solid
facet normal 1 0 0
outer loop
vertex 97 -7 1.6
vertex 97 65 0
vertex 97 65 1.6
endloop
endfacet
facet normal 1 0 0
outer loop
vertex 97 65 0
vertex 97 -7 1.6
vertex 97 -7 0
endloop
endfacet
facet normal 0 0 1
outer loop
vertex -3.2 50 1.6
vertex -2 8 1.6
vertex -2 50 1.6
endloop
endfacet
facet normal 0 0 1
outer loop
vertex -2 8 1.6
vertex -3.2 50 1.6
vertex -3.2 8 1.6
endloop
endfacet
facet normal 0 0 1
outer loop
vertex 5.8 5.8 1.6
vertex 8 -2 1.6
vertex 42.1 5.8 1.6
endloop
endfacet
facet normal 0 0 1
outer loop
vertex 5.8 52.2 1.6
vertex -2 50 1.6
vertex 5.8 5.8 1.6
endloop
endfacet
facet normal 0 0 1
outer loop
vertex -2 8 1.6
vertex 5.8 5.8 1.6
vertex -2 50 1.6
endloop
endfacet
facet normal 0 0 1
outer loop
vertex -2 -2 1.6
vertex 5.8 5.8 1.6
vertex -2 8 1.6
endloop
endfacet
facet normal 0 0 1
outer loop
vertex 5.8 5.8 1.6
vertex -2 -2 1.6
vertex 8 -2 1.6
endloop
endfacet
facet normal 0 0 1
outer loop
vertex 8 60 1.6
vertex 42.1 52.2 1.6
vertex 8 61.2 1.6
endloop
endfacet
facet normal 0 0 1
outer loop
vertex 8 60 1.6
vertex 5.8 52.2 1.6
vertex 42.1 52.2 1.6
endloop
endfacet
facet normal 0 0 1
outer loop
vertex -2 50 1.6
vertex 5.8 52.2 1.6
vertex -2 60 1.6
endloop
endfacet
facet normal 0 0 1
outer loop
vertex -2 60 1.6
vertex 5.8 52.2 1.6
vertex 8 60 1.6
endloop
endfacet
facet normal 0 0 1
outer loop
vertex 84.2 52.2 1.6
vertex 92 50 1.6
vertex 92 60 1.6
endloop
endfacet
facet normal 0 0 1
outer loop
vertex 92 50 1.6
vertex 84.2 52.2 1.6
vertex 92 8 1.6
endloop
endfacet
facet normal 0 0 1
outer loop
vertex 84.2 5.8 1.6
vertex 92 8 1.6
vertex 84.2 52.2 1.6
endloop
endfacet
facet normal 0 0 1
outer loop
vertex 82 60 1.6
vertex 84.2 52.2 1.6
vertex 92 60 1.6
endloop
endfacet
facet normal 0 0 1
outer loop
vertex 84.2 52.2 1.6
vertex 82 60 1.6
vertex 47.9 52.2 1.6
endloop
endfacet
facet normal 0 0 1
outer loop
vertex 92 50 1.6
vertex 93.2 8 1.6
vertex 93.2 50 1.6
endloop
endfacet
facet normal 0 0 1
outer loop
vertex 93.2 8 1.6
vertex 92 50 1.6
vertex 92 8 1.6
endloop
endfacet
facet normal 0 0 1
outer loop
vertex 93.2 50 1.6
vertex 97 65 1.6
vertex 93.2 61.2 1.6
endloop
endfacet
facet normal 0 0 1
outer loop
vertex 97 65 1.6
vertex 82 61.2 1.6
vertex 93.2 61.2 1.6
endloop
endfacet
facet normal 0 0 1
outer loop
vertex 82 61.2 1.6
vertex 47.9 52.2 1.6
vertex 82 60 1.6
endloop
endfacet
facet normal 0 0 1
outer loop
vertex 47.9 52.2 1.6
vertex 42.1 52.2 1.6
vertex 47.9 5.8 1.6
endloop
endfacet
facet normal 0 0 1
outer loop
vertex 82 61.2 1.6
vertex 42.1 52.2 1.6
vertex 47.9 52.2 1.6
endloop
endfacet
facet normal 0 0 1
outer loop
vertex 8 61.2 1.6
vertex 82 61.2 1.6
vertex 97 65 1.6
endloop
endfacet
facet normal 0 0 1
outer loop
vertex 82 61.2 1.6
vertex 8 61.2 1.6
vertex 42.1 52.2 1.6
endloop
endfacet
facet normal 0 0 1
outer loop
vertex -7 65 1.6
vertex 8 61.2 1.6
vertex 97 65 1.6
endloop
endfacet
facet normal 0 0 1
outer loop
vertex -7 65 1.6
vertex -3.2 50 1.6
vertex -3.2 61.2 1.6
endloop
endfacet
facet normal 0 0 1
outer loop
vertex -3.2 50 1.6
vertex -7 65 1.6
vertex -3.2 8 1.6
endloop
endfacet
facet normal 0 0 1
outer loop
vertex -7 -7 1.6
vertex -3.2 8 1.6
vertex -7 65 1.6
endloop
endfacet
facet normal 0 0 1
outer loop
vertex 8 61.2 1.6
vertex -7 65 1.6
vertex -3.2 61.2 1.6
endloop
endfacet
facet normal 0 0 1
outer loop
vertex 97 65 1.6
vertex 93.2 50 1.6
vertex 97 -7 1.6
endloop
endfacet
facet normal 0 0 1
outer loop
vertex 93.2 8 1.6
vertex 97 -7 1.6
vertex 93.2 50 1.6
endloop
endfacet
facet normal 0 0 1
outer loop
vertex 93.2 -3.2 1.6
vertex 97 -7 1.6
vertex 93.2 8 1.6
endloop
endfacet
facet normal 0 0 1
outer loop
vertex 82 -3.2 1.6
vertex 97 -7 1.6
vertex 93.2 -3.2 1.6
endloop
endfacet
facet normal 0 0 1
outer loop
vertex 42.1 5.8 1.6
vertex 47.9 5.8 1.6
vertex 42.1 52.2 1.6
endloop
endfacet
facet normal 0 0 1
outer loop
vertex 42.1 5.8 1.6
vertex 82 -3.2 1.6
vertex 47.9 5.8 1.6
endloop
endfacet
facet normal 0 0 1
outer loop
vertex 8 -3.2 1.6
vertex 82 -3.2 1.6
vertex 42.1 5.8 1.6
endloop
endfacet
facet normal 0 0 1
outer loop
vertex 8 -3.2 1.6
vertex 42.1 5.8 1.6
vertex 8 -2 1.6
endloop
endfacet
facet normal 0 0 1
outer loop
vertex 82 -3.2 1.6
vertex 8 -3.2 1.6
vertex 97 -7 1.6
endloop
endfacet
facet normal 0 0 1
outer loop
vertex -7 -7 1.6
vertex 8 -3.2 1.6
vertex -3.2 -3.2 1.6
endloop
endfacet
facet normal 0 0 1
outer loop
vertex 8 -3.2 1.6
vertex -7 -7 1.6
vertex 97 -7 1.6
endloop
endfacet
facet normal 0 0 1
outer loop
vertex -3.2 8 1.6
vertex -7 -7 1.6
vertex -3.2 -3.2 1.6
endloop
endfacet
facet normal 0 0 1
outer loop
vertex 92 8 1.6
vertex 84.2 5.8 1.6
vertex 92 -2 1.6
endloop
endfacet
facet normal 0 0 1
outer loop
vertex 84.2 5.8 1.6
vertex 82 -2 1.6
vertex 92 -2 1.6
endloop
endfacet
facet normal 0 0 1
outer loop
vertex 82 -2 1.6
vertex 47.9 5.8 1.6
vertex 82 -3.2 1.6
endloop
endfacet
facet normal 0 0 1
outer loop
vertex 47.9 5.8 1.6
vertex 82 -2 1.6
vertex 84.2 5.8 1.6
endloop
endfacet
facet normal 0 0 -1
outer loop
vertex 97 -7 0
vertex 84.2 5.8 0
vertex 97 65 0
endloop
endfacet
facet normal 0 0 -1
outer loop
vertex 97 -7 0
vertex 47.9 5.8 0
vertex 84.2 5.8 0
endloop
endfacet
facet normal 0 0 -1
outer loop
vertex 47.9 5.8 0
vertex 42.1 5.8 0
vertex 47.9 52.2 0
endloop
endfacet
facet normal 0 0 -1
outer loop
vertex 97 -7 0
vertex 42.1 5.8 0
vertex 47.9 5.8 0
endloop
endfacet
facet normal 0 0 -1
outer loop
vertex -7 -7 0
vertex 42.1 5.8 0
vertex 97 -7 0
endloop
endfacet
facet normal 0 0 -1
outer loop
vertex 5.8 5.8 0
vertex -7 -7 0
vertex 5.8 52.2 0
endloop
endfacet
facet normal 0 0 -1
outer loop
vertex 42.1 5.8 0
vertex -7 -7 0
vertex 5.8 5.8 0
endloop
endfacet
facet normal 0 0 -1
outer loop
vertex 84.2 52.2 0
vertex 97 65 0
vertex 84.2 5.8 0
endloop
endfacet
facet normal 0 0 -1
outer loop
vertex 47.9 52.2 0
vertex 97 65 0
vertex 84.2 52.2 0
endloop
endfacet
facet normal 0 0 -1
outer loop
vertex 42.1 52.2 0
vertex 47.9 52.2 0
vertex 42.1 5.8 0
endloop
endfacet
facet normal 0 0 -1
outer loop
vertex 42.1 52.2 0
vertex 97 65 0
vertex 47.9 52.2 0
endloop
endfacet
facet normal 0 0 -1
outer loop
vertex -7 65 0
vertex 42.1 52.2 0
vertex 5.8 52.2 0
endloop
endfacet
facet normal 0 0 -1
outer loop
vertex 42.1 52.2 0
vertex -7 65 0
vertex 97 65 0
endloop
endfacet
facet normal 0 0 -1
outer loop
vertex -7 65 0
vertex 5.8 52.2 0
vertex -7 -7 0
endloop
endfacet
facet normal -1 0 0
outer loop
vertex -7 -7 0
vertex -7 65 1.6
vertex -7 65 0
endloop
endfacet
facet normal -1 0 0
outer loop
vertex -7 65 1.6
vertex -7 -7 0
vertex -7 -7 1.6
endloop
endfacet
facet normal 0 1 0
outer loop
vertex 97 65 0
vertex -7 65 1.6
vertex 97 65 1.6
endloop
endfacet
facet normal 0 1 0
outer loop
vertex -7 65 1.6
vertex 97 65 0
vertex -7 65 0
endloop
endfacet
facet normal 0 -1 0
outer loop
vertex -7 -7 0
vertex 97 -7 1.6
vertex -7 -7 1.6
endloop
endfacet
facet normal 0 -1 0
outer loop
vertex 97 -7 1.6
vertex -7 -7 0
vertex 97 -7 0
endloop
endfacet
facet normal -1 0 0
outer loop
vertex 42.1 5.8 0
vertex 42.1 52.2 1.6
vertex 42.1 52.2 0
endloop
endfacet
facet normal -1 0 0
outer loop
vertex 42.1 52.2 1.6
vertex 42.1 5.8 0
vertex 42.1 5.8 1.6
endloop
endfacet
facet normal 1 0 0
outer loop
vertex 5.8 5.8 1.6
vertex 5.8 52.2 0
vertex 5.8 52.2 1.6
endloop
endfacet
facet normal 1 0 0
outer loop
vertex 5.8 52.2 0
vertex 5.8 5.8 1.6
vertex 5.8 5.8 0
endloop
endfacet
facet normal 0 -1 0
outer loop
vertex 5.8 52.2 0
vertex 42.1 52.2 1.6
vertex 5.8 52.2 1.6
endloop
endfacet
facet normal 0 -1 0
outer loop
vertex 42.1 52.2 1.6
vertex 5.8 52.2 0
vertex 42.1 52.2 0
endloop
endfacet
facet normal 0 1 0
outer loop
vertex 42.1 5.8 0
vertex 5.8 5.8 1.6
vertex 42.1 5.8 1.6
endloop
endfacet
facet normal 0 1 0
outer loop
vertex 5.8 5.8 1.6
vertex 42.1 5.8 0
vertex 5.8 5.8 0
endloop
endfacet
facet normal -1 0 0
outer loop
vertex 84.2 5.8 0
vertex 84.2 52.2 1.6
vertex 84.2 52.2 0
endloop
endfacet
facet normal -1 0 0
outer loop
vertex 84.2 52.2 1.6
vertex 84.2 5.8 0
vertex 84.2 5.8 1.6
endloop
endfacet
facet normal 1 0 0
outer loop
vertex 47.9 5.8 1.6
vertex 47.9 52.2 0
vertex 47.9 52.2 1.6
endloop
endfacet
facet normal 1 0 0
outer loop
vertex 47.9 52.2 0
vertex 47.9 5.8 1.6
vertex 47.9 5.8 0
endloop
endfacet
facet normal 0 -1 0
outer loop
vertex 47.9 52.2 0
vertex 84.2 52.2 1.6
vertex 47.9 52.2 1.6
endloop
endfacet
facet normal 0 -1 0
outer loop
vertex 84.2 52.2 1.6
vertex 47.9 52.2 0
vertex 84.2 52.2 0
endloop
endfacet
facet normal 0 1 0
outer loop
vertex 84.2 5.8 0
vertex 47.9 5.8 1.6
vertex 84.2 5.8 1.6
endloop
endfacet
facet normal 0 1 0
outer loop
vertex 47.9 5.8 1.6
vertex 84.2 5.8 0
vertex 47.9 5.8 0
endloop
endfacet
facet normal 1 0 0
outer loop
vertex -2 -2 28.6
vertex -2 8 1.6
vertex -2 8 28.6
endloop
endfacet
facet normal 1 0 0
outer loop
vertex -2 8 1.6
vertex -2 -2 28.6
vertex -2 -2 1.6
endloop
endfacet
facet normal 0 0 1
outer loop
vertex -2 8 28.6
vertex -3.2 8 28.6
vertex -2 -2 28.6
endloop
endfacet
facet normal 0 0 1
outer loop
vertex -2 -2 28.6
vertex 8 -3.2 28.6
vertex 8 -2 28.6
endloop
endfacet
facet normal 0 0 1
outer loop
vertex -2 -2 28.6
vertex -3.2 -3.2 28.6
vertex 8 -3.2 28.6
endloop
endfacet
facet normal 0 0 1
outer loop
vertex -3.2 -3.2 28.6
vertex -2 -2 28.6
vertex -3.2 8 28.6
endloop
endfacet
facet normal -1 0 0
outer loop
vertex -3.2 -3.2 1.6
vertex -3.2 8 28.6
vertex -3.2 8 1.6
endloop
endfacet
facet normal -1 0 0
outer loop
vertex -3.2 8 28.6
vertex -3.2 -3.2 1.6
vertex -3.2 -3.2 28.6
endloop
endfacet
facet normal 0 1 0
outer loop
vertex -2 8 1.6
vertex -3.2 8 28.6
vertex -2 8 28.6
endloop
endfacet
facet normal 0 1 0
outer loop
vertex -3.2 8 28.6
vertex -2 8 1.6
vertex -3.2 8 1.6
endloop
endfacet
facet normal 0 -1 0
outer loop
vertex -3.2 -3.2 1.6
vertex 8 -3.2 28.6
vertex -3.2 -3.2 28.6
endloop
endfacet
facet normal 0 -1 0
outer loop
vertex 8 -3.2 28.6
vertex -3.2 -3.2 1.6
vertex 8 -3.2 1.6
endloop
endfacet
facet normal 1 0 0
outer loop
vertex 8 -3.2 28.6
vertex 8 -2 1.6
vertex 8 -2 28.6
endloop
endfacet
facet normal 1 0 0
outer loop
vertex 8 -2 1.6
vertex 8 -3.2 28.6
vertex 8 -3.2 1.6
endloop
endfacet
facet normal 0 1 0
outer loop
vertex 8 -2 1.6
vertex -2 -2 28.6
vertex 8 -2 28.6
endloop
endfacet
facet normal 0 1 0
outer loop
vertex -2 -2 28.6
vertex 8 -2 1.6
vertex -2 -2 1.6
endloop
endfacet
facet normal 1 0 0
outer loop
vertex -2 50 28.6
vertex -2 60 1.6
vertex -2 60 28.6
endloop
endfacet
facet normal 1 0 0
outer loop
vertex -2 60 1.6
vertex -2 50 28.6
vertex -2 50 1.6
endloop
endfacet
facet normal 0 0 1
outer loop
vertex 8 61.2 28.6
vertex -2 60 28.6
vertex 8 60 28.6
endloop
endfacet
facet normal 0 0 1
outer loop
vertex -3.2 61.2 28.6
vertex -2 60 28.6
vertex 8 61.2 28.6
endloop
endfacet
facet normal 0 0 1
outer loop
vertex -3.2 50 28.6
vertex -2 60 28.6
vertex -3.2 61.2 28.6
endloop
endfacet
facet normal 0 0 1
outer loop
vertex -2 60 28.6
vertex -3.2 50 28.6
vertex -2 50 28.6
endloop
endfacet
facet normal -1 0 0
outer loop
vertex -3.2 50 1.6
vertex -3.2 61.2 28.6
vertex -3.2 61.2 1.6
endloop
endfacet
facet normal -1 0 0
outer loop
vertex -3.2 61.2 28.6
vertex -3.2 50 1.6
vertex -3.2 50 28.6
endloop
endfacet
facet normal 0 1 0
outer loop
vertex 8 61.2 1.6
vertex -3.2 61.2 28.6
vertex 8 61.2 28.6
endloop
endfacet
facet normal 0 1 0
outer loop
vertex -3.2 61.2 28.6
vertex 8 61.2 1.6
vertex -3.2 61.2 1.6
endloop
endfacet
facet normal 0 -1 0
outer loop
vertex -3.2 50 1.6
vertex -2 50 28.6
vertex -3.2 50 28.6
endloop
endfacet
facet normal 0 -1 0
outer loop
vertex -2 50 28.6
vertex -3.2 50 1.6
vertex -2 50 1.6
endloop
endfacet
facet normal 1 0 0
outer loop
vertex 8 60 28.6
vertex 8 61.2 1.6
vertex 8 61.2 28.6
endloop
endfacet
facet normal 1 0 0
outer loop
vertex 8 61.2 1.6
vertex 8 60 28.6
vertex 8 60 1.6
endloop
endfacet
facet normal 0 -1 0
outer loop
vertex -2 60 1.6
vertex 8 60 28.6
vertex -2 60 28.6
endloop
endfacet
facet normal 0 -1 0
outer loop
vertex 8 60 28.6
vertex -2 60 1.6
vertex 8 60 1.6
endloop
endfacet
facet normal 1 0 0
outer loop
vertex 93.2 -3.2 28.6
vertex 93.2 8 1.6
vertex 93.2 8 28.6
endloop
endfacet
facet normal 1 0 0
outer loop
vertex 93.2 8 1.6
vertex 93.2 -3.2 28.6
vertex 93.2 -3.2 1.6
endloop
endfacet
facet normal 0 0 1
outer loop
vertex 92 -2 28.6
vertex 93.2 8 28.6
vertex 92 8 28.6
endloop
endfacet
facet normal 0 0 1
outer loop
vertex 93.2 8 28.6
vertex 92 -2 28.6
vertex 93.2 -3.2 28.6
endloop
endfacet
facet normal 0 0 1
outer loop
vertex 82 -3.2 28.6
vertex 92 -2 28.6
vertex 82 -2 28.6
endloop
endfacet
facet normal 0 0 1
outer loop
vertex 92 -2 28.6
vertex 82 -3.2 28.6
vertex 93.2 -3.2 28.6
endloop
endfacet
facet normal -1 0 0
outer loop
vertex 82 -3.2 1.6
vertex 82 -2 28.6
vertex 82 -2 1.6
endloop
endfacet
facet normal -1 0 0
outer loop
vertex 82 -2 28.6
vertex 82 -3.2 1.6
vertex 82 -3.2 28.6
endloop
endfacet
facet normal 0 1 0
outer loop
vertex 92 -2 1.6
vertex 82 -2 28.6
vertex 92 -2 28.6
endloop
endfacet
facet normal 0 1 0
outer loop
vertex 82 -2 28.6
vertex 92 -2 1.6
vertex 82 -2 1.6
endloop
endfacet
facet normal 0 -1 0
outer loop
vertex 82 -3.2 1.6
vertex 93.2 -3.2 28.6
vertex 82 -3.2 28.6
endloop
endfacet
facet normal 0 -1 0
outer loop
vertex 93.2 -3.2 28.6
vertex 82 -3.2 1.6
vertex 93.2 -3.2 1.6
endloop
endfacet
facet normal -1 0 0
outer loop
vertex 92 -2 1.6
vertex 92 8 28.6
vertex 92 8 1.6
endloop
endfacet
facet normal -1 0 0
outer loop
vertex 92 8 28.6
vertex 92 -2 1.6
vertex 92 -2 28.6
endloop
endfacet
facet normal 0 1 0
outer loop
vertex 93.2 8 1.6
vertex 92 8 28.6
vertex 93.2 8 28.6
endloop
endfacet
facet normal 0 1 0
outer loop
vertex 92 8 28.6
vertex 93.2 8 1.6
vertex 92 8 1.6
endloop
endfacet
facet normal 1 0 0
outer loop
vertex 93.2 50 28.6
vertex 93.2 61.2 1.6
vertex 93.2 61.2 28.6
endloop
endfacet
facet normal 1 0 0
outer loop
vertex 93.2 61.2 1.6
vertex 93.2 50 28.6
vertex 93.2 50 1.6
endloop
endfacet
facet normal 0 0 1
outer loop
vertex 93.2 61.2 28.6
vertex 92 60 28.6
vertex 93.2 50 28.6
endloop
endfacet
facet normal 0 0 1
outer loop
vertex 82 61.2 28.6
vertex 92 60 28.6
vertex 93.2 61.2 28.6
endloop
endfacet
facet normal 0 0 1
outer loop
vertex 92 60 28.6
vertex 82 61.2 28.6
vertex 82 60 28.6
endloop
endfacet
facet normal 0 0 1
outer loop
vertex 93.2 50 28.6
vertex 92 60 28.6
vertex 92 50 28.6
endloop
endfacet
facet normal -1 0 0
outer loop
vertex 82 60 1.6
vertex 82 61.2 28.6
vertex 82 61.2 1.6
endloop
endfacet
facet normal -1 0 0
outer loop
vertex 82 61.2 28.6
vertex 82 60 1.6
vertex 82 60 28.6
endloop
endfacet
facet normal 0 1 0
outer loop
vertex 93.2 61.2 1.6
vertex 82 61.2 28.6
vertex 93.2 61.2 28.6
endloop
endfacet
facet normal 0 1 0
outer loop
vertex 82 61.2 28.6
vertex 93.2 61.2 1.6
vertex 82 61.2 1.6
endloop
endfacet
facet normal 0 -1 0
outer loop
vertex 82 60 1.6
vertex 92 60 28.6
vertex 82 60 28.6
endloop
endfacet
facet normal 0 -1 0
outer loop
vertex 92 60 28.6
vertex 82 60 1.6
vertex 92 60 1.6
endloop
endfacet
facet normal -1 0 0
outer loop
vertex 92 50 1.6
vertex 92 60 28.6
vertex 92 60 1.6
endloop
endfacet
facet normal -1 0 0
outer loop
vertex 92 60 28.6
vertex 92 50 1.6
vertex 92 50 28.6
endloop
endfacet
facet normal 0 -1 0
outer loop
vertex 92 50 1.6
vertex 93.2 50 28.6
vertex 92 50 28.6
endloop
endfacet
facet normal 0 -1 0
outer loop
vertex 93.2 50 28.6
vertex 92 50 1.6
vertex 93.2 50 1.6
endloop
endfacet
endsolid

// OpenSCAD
// Card Holder

// Card Length
CardLength = 90;

// Card Width
CardWidth = 58;

// Tolerance
Tolerance = 2;

// Size Of Nozzle
SizeOfNozzle = 0.4;

// Outside Skirt
OutsideSkirt = 5;

//Wall Thickness In Layers
WallThicknessInLayers = 3;

//Wall Height
WallHeight = 27;

//Wall Length
WallLength = 10;

//BottomThickness
BottomThickness = 1.6;

//Cut Out Percentage
CutOutPercentage = 80;



WallThickness = WallThicknessInLayers * SizeOfNozzle;
Rim = CardWidth * ((100 - CutOutPercentage) / 2) / 100;
CutOutLength = (CardLength - 3 * Rim) / 2;
CutOutWidth = CardWidth * CutOutPercentage / 100;


// Bottom Layer
difference(){
	translate([	0 - Tolerance - OutsideSkirt,
					0 - Tolerance - OutsideSkirt,
					0])
	cube(size = [	CardLength + 2 * (Tolerance + OutsideSkirt),
						CardWidth + 2 * (Tolerance + OutsideSkirt),
						BottomThickness]);

	// Cut Out
	translate([	0 + Rim,0 + Rim,0])
	cube(size = [	CutOutLength,
						CutOutWidth,
						BottomThickness]);

	translate([	0 + 2 * Rim + CutOutLength,0 + Rim,0])
	cube(size = [	CutOutLength,
						CutOutWidth,
						BottomThickness]);

}


// Walls(LL)

	translate([	0 - Tolerance - WallThickness,
					0 - Tolerance - WallThickness,
				   BottomThickness])
	cube(size = [	WallThickness,
						WallThickness + WallLength,
						WallHeight]);

	translate([	0 - Tolerance - WallThickness,
					0 - Tolerance - WallThickness,
				   BottomThickness])
	cube(size = [	WallThickness + WallLength,
						WallThickness,
						WallHeight]);


// Walls(UL)

	translate([	0 - Tolerance - WallThickness,
					CardWidth + Tolerance - WallLength,
				   BottomThickness])
	cube(size = [	WallThickness,
						WallThickness + WallLength,
						WallHeight]);

	translate([	0 - Tolerance - WallThickness,
					CardWidth + Tolerance,
				   BottomThickness])
	cube(size = [	WallThickness + WallLength,
						WallThickness,
						WallHeight]);

// Walls(LR)

	translate([	CardLength + Tolerance - WallLength,
					0 - Tolerance - WallThickness,
				   BottomThickness])
	cube(size = [	WallThickness + WallLength,
						WallThickness,
						WallHeight]);

	translate([	CardLength + Tolerance,
					0 - Tolerance - WallThickness,
				   BottomThickness])
	cube(size = [	WallThickness,
						WallThickness + WallLength,
						WallHeight]);

// Walls(UR)

	translate([	CardLength + Tolerance - WallLength,
					CardWidth + Tolerance,
				   BottomThickness])
	cube(size = [	WallThickness + WallLength,
						WallThickness,
						WallHeight]);

	translate([	CardLength + Tolerance,
					CardWidth + Tolerance - WallLength,
				   BottomThickness])
	cube(size = [	WallThickness,
						WallThickness + WallLength,
						WallHeight]);





